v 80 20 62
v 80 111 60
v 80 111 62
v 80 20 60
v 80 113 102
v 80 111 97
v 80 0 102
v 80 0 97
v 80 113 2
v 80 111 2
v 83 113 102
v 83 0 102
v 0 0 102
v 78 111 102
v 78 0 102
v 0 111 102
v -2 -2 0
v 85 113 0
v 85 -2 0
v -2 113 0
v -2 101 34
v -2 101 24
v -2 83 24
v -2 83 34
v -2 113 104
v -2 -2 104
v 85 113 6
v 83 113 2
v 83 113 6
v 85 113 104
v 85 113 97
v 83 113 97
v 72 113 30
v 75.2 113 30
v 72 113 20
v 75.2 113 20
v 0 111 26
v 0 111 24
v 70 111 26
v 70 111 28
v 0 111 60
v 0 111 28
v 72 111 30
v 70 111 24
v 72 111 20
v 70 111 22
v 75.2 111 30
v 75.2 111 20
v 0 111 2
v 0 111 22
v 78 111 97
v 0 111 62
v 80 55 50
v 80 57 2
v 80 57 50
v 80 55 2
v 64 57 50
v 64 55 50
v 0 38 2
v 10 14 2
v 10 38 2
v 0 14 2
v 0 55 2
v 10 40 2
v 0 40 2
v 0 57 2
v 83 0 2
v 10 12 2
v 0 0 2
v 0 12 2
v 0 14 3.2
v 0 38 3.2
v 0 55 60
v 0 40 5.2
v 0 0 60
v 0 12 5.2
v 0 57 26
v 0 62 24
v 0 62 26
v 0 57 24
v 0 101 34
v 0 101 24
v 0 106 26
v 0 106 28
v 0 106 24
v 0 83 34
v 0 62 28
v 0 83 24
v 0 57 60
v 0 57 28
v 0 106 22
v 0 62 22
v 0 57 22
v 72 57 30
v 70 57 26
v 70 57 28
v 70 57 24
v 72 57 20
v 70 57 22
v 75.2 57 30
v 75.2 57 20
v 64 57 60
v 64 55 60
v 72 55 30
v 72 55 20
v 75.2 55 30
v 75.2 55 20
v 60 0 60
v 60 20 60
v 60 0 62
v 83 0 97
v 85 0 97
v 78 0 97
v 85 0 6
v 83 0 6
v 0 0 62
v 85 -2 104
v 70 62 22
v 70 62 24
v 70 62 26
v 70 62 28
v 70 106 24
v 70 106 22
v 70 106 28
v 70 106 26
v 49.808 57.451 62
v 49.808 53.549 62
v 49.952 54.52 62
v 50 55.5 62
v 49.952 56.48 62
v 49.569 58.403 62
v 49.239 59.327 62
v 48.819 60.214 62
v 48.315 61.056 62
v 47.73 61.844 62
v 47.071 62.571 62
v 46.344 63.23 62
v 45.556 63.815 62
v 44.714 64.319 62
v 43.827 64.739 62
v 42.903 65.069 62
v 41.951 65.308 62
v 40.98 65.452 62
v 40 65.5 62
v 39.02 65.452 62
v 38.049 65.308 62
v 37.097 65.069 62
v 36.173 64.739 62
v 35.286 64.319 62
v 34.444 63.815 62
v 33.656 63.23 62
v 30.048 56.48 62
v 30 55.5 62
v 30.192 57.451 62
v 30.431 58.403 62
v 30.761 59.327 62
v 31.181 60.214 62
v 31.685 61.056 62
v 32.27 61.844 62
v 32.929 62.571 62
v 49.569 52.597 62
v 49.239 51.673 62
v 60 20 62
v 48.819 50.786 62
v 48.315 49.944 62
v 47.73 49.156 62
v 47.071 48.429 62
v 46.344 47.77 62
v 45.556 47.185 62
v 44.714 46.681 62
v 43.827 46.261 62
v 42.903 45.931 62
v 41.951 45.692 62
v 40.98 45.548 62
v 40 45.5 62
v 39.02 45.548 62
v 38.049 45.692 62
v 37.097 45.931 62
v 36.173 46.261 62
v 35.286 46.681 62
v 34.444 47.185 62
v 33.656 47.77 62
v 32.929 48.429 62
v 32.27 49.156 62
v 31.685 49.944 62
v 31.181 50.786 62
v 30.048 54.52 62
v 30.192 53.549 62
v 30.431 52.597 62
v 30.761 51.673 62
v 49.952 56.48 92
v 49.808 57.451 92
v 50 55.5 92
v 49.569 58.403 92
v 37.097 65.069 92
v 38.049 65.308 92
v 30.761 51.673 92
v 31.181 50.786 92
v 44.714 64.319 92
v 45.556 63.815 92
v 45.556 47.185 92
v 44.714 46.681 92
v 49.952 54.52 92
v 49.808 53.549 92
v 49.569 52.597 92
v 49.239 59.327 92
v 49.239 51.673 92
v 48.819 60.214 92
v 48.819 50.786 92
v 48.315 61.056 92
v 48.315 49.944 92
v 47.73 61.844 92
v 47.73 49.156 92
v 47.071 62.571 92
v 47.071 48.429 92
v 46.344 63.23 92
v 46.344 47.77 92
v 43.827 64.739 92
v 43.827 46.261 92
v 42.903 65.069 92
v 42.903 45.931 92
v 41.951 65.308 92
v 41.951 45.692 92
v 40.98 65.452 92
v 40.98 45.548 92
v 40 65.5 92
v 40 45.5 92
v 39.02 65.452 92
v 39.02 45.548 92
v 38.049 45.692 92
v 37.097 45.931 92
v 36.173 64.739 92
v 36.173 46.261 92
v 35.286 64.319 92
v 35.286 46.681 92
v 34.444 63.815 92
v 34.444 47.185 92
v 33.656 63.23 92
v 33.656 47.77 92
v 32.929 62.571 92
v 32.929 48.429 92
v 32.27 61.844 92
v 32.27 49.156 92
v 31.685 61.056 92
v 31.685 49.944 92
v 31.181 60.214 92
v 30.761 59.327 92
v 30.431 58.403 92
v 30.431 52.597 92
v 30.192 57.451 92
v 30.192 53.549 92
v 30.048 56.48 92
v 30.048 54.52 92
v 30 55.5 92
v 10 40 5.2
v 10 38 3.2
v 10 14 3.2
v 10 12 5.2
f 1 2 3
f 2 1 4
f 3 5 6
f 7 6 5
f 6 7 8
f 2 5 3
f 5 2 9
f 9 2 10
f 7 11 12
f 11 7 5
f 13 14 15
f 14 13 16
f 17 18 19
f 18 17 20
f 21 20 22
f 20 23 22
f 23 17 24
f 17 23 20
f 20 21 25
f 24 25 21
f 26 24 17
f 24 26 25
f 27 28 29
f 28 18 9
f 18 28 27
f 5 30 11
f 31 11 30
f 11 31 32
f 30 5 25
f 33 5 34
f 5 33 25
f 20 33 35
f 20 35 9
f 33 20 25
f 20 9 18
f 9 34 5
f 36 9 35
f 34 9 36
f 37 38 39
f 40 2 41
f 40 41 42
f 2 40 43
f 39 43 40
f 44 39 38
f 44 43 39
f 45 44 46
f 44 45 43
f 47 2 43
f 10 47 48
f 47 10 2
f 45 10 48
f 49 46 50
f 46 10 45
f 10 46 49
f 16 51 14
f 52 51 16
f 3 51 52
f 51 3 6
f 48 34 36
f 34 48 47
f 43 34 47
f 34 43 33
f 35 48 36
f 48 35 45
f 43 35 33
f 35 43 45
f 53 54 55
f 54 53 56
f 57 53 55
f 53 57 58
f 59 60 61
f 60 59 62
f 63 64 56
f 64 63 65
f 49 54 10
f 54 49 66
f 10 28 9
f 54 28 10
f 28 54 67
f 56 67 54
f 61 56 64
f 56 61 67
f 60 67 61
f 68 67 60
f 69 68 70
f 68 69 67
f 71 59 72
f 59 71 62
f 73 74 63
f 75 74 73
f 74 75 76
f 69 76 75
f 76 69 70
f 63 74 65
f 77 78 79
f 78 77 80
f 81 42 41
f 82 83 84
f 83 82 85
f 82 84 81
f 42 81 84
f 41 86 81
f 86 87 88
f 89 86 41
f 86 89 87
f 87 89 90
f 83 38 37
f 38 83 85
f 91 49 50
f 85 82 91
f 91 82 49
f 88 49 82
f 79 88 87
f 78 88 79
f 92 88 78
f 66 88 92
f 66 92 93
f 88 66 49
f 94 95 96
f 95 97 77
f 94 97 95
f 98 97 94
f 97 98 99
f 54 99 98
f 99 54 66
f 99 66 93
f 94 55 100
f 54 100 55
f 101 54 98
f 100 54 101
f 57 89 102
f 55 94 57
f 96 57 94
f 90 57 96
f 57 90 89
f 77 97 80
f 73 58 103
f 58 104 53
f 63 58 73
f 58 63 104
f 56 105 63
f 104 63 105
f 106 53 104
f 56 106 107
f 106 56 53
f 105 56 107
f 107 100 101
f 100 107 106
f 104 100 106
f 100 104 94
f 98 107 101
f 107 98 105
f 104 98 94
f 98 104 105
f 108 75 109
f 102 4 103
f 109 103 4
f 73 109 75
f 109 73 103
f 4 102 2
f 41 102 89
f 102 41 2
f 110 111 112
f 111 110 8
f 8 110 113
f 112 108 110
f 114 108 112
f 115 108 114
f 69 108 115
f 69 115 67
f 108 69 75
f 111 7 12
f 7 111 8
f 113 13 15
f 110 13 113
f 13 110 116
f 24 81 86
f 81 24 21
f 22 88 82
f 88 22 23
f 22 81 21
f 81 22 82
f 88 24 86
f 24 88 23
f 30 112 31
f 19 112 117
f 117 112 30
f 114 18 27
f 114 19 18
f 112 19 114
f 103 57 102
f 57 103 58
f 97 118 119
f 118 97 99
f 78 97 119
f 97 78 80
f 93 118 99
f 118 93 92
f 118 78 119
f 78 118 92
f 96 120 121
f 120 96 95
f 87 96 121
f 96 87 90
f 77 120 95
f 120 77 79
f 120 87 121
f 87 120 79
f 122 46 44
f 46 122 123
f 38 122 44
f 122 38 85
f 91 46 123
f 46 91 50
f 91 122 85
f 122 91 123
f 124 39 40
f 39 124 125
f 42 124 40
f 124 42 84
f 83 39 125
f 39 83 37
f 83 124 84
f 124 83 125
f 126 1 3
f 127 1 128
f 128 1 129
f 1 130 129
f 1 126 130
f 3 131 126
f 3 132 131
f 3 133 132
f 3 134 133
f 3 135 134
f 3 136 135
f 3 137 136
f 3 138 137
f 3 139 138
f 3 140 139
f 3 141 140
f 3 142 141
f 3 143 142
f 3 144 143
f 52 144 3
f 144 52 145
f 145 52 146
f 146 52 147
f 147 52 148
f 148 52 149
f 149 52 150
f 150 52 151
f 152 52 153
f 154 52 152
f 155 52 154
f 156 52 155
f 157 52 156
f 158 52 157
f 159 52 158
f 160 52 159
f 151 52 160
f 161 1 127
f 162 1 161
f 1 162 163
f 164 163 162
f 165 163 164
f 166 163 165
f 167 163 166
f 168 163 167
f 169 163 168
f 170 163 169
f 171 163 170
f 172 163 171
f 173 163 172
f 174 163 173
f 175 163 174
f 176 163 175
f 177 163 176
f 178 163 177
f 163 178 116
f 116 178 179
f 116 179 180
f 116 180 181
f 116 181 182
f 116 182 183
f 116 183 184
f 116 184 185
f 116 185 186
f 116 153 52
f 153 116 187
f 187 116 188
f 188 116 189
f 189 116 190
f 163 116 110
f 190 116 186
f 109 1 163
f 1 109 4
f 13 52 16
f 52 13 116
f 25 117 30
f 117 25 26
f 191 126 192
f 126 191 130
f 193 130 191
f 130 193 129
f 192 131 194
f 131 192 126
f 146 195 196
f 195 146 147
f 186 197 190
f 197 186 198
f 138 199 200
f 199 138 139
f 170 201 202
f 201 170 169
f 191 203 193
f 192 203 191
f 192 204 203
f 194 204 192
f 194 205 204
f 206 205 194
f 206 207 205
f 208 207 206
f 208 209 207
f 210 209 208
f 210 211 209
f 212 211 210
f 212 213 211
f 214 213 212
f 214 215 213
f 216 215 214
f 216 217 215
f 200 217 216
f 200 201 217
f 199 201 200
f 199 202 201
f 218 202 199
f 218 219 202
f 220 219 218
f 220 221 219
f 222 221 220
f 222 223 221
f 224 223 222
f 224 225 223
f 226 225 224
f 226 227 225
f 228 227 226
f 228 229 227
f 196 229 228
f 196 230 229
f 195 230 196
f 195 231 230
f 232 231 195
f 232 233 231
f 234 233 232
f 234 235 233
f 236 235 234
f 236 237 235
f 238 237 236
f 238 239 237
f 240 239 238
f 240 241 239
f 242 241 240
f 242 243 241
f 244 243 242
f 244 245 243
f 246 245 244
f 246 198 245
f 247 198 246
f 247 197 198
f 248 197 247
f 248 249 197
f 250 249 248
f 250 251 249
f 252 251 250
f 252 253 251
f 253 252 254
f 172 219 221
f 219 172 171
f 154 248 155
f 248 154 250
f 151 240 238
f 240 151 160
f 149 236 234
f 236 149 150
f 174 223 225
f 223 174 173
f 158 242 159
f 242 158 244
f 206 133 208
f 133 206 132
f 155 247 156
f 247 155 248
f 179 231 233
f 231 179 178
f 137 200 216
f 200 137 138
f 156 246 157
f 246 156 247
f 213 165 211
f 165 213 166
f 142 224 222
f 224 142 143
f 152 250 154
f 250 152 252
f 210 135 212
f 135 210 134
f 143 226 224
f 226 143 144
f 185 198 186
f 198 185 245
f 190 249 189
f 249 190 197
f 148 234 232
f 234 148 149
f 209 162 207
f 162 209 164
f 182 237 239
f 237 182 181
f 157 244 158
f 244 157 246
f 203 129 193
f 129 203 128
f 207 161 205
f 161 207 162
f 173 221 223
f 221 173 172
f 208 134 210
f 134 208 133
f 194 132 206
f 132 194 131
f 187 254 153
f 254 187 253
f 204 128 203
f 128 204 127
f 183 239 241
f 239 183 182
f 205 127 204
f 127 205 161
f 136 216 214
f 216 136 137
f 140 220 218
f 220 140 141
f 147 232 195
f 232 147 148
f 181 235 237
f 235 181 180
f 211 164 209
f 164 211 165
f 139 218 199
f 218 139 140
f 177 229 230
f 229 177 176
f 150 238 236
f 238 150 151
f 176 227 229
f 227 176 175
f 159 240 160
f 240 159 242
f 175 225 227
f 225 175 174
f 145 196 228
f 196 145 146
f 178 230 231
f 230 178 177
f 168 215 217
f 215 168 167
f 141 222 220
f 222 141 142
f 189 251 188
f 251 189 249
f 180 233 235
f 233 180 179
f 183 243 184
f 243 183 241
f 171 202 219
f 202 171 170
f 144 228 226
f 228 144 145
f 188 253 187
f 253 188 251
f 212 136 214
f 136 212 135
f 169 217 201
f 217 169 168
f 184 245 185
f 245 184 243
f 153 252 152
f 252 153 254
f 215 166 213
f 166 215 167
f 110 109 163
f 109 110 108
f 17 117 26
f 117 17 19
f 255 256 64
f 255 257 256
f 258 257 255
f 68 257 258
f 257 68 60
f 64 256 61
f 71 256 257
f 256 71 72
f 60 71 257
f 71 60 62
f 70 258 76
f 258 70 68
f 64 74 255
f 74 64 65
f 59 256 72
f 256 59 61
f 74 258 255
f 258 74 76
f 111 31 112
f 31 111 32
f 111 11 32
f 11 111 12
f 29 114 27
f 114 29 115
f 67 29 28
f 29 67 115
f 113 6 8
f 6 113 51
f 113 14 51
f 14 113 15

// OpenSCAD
$fn=64;
cube([85, 111, 2]);
translate([0, 55, 50])
cube([64, 2, 10]);
translate([0, 57, 22])
cube([70, 5, 2]);
translate([0, 57, 26])
cube([70, 5, 2]);
translate([0, 106, 22])
cube([70, 5, 2]);
translate([0, 106, 26])
cube([70, 5, 2]);
translate([-2, 20 , 60])
cube([82, 93, 2]);
translate([-2, 0 ,62])
cube([2, 113, 40]);
translate([-2, 0, 102])
cube([87, 113, 2]);
translate([40, 55.5, 62])
cylinder(h = 30, r = 10);
translate([-2, 0, 60])
cube([62, 20, 2]);
translate([-2, 111, 0]){
difference(){
    cube([82 , 2, 102]);
    translate([74, -1, 20]){ 
    cube([3.2, 4, 10]);
        }
    }
}
translate([0, 55, 2]){
difference(){
    cube([80, 2, 48]);
    translate([72, -1, 18]){
    cube([3.2, 4, 10]);
            }
       }
}
translate([-2, -2, 0])
cube([87, 2, 104]);
translate([-2, 0, 0]){
difference(){
    cube([2, 111, 60]);
    translate([-1, 83, 24]){
    cube([4, 18, 10]);
        }
    }
}
translate([0, 12, 2])
cube([10, 2, 1.2]);
translate([0, 38, 2])
cube([10, 2, 1.2]);
translate([0, 12, 3.2])
cube([10, 28, 2]);
translate([83, 0, 97])
cube([2, 113, 5]);
translate([83, 0, 2])
cube([2, 113, 4]);
translate([80, 111, 0])
cube([5, 2, 2]);
translate([78, 0, 97])
cube([2, 111, 5]);
